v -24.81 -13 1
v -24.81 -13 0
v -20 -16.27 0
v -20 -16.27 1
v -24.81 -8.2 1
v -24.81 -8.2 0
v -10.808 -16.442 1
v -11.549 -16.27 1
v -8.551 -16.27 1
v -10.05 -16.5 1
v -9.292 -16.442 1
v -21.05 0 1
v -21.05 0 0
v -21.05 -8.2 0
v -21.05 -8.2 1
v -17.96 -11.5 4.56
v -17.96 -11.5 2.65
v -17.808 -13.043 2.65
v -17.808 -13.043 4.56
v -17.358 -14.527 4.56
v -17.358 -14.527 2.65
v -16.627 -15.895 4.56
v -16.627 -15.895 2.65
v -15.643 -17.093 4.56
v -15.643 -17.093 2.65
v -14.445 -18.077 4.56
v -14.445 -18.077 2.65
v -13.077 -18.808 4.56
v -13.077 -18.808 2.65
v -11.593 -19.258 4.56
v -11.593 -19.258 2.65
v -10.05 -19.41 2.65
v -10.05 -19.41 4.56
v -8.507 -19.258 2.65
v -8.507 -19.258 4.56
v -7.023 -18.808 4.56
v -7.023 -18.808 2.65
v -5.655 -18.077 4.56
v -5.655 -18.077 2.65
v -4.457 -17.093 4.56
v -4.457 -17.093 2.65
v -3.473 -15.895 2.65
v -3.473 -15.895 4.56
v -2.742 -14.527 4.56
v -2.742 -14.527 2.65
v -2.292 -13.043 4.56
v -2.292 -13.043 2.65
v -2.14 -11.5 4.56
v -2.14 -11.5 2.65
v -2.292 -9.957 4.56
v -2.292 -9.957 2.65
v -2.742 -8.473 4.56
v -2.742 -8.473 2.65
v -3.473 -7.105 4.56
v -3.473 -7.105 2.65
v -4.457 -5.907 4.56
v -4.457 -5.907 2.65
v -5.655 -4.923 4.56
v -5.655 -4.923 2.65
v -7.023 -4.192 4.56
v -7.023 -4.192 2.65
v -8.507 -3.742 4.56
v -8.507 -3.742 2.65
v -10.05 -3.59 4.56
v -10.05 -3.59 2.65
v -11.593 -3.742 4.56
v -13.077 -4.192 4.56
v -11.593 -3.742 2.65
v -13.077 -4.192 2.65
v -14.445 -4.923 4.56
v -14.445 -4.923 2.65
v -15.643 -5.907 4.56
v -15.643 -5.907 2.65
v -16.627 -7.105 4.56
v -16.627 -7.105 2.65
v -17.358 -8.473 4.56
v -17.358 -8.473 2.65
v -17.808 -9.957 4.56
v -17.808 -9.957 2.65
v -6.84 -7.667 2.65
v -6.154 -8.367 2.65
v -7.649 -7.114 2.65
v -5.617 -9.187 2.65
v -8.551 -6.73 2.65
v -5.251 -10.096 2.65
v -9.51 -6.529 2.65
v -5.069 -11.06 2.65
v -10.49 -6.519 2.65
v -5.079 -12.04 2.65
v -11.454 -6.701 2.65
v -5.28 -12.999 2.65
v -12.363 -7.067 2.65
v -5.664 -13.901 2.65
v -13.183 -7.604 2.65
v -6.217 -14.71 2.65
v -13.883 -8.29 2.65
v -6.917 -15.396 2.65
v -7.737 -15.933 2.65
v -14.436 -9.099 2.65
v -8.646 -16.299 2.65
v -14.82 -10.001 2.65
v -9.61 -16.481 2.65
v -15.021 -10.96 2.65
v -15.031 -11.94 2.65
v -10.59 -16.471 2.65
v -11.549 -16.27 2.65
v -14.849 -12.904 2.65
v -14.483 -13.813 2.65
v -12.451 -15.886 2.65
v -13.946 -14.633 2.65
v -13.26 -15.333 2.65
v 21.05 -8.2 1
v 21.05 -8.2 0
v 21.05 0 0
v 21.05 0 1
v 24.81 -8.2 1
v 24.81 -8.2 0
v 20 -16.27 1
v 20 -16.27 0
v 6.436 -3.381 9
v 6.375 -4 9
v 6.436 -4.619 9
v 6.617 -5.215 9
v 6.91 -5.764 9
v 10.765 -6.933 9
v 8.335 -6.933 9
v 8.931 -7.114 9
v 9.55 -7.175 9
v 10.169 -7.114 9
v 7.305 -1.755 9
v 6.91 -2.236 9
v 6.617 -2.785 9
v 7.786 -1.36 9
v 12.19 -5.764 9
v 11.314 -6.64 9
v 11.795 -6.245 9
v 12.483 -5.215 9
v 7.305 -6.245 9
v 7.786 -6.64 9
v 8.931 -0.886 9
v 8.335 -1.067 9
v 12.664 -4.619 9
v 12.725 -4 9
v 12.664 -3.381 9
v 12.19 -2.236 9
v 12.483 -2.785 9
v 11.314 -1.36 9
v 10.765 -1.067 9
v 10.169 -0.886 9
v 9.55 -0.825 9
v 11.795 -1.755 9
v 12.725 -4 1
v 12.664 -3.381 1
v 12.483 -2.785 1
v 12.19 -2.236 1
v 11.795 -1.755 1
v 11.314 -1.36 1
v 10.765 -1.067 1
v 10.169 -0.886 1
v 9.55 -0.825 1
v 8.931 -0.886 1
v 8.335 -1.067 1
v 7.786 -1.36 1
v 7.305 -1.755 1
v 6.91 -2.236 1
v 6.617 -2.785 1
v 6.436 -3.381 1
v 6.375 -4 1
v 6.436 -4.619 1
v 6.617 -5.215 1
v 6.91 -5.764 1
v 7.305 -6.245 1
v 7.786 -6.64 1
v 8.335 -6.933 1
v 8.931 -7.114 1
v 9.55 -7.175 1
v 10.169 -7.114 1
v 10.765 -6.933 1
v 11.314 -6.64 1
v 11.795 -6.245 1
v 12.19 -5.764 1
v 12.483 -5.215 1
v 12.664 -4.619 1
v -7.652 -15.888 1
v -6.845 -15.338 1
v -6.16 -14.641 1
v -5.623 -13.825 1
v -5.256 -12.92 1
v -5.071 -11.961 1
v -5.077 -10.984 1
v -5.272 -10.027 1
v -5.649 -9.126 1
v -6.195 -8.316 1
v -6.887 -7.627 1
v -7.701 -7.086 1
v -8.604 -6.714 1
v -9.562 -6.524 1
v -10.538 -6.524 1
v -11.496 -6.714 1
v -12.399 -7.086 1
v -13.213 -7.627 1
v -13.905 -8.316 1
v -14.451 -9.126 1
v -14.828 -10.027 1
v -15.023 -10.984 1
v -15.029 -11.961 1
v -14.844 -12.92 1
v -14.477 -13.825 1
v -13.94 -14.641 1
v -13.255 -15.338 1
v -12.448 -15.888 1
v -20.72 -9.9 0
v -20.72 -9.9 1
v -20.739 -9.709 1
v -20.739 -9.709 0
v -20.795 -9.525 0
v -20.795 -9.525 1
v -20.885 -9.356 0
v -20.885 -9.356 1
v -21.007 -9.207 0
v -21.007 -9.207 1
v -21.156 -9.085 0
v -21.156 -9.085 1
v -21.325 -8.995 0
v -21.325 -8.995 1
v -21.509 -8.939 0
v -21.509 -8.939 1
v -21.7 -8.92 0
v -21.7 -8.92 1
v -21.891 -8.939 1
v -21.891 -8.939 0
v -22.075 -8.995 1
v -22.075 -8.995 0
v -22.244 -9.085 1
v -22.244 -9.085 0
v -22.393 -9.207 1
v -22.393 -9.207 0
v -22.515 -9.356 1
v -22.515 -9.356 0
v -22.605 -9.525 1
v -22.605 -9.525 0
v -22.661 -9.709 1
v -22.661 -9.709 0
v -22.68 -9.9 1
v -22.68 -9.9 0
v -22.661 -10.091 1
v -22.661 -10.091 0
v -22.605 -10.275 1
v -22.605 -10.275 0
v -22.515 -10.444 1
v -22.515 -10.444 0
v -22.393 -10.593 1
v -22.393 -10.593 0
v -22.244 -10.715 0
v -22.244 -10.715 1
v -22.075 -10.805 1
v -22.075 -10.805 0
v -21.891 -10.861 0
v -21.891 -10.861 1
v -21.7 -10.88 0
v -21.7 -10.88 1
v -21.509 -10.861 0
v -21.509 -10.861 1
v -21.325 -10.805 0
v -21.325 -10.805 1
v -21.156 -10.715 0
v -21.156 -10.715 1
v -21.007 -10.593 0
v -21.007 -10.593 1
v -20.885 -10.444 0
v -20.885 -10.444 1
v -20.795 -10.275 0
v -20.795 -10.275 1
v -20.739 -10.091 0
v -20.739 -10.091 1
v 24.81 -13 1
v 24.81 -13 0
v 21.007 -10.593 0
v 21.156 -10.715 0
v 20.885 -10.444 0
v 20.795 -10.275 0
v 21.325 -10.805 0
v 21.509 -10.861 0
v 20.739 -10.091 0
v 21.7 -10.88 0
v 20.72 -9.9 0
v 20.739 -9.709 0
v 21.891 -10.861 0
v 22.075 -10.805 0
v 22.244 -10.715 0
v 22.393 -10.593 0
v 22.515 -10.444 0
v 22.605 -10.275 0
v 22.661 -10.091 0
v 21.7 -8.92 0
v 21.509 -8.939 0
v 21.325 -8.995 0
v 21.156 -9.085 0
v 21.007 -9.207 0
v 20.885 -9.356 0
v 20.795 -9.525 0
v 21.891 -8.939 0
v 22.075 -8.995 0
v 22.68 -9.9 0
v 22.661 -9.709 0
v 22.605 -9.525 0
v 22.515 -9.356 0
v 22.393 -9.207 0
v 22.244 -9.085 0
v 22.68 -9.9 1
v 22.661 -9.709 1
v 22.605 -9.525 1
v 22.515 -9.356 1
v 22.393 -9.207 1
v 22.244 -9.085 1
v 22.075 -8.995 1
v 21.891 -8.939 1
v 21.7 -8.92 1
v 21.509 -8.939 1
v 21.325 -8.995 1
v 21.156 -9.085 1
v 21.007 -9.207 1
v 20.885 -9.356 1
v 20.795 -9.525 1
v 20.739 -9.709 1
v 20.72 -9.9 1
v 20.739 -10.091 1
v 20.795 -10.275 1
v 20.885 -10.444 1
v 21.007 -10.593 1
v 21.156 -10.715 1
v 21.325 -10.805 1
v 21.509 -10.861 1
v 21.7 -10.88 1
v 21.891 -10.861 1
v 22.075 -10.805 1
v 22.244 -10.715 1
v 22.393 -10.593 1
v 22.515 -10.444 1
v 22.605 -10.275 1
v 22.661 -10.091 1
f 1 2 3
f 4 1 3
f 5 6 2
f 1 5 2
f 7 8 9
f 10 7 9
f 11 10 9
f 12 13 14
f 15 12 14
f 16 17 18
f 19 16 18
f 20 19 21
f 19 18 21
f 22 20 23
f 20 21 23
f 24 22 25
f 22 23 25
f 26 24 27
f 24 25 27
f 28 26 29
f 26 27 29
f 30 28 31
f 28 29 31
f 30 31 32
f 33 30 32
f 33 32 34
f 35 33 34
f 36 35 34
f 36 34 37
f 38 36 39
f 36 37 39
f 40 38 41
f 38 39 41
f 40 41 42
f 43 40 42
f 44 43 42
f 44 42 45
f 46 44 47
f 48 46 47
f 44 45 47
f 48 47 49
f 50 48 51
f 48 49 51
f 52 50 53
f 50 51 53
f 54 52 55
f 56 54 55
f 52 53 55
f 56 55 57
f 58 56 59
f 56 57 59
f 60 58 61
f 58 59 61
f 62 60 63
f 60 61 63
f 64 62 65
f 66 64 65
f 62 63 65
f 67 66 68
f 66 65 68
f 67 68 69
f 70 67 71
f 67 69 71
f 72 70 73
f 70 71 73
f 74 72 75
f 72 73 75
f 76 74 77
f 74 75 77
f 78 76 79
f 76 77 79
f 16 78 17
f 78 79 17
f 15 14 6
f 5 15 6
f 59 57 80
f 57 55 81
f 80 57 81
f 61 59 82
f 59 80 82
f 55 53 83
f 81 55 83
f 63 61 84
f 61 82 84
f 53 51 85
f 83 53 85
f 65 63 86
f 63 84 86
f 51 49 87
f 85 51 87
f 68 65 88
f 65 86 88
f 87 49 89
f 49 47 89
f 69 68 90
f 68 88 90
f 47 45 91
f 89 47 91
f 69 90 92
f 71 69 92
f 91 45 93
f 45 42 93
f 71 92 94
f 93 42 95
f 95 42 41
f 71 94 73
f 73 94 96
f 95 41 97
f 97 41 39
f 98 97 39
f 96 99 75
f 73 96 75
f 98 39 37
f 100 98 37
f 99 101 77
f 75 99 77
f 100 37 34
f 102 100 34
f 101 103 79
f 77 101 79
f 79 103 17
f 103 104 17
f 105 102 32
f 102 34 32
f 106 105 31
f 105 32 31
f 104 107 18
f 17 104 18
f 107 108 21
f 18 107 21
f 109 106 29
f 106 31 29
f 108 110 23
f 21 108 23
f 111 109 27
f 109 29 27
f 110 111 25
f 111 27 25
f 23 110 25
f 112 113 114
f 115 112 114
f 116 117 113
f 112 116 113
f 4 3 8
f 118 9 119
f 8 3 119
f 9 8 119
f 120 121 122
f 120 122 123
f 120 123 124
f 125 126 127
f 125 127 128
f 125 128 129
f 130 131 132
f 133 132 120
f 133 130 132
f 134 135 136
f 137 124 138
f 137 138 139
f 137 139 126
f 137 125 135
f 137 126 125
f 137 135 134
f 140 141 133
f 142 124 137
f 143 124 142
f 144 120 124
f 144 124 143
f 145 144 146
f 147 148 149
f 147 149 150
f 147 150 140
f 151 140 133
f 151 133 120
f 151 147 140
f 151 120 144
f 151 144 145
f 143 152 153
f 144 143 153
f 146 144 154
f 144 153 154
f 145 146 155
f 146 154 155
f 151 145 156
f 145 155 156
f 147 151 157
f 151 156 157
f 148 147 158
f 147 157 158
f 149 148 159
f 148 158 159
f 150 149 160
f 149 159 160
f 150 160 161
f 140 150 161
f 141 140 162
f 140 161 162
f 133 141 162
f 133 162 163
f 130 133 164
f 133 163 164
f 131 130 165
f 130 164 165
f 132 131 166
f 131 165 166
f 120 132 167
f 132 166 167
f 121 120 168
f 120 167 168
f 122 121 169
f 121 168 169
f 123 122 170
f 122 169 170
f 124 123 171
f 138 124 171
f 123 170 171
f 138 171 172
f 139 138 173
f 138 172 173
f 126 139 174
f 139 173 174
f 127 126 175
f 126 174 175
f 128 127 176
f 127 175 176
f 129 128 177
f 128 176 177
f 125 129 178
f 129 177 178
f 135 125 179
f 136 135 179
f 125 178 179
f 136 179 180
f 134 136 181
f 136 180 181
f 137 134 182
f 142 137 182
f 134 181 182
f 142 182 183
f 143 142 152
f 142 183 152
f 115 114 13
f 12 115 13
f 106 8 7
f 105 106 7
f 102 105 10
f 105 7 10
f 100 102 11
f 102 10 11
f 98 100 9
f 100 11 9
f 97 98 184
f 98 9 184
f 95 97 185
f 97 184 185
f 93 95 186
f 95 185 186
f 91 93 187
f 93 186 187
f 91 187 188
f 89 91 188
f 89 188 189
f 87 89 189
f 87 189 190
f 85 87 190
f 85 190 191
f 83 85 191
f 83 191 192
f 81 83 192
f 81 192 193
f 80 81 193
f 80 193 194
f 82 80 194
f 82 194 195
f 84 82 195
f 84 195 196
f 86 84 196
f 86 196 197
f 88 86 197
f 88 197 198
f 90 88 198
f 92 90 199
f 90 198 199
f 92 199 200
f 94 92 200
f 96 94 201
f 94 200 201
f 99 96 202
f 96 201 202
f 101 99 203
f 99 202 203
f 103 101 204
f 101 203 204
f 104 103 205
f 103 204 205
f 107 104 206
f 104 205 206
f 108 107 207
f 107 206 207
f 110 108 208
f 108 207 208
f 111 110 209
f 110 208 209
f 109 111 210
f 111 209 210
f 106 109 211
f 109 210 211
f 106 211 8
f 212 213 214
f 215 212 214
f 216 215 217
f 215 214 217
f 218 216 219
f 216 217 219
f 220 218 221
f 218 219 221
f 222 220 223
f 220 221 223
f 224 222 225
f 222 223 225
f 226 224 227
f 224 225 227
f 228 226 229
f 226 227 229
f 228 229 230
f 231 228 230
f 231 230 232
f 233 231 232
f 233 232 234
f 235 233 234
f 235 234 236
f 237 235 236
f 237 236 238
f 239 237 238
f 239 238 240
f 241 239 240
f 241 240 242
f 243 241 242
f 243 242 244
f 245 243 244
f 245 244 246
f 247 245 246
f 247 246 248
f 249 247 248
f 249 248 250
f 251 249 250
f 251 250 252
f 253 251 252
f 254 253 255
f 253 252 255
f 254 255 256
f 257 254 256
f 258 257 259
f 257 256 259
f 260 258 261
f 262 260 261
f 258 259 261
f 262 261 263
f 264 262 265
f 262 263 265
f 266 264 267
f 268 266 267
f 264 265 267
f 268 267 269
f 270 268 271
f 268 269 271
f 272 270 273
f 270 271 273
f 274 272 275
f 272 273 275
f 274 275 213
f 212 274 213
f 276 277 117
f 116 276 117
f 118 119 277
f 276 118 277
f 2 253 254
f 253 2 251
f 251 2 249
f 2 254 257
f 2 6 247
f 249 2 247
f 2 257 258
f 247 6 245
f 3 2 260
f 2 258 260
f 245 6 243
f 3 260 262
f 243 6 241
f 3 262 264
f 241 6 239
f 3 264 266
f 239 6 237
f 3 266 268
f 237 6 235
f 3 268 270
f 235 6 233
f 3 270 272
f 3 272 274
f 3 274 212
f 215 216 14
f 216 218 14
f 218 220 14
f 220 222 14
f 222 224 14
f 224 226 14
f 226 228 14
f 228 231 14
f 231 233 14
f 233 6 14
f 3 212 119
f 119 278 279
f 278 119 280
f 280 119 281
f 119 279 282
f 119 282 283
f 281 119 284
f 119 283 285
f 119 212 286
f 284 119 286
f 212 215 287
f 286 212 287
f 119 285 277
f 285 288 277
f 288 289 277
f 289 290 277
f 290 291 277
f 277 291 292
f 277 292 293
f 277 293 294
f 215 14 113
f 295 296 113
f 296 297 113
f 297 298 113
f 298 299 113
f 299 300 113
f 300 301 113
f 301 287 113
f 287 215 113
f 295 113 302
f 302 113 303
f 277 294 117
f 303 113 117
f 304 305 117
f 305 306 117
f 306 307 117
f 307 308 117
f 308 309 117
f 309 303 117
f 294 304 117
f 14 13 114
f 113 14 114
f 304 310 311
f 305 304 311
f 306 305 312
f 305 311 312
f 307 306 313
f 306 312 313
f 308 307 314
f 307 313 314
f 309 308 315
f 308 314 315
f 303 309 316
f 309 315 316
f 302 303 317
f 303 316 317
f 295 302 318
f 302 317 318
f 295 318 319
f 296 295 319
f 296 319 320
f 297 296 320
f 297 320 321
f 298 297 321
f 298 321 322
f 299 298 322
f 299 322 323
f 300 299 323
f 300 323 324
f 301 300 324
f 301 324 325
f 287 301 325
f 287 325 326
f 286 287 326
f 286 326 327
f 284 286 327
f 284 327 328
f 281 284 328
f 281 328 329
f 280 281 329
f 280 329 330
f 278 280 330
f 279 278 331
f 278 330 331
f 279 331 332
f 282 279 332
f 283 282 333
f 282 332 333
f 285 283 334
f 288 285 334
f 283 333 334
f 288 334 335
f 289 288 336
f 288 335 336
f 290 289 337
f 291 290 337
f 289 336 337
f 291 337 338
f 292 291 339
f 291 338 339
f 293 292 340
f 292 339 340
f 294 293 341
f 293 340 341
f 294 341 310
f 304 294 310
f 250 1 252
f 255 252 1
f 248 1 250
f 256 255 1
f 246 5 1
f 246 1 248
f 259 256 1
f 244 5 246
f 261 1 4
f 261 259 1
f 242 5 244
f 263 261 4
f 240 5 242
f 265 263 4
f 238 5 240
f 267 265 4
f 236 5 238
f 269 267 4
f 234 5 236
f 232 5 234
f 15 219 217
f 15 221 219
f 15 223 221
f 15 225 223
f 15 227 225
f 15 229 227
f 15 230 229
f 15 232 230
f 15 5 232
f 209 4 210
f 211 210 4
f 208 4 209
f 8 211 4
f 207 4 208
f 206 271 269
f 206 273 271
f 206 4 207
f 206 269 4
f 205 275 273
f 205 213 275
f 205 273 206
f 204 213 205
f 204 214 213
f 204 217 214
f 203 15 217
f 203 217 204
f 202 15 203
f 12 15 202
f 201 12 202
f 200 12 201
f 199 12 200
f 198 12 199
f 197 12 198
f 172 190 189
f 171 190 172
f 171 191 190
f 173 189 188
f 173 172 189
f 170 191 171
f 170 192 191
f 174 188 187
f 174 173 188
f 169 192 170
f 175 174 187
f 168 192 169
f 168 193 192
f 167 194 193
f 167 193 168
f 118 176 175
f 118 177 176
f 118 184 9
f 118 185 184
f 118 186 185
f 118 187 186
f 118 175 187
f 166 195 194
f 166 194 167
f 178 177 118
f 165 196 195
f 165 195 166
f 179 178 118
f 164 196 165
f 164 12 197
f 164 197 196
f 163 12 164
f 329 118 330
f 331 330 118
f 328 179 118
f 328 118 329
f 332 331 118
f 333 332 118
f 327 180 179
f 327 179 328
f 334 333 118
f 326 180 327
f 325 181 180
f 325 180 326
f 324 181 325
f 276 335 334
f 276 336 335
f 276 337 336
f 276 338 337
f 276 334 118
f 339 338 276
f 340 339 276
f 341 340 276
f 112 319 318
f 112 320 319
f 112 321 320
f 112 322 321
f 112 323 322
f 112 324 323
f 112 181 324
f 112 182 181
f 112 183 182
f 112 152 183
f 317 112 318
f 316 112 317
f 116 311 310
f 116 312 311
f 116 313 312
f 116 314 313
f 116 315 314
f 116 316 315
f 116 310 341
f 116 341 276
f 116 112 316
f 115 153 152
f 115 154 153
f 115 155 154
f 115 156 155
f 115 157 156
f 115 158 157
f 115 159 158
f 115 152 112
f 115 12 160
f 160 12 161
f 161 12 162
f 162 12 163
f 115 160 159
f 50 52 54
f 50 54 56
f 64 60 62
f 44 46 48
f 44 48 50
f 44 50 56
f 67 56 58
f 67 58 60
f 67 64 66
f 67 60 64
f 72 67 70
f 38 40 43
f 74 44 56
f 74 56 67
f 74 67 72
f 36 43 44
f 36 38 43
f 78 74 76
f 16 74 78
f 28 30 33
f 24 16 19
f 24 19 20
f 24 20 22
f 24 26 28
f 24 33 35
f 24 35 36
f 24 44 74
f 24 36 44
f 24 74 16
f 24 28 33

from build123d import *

# Parameters (mm, degrees)
BOSS_EXTRUDE1_DEPTH = 1
CUT_EXTRUDE1_REACH  = 31.686
SKETCH5_R           = 0.98
SKETCH2_R           = 3.175
BOSS_EXTRUDE2_DEPTH = 8
BOSS_EXTRUDE3_START = 1.65
SKETCH3_R           = 7.91
BOSS_EXTRUDE3_DEPTH = 1.91
BOSS_EXTRUDE4_REACH = 34.501
SKETCH4_R           = 5


with BuildPart() as part:
    # Sketch1 → Boss-Extrude1 (new body)
    with BuildSketch(Plane.XY):
        Polygon((21.05, -8.2), (21.05, 0), (0, 0), (0, -16.27), (20, -16.27), (24.81, -13), (24.81, -8.2), align=None)
        Polygon((0, -16.27), (0, 0), (-21.05, 0), (-21.05, -8.2), (-24.81, -8.2), (-24.81, -13), (-20, -16.27), align=None)
    extrude(amount=BOSS_EXTRUDE1_DEPTH)

    # Sketch5 → Cut-Extrude1 (cut, up to next)
    with BuildSketch(Plane.XY.offset(1), mode=Mode.PRIVATE) as cut_extrude1_sk1:
        with Locations((-21.7, -9.9)):
            Circle(SKETCH5_R)
    cut_extrude1_tool1 = extrude(cut_extrude1_sk1.sketch, amount=-CUT_EXTRUDE1_REACH, mode=Mode.PRIVATE) & part.part
    # Sketch5 → Cut-Extrude1 (cut, up to next)
    with BuildSketch(Plane.XY.offset(1), mode=Mode.PRIVATE) as cut_extrude1_sk2:
        with Locations((21.7, -9.9)):
            Circle(SKETCH5_R)
    cut_extrude1_tool2 = extrude(cut_extrude1_sk2.sketch, amount=-CUT_EXTRUDE1_REACH, mode=Mode.PRIVATE) & part.part
    add(cut_extrude1_tool1.solids().sort_by_distance((-21.7, -9.9, 1))[0], mode=Mode.SUBTRACT)
    add(cut_extrude1_tool2.solids().sort_by_distance((21.7, -9.9, 1))[0], mode=Mode.SUBTRACT)

    # Sketch2 → Boss-Extrude2 (add)
    with BuildSketch(Plane.XY.offset(1)):
        with Locations((9.55, -4)):
            Circle(SKETCH2_R)
    extrude(amount=BOSS_EXTRUDE2_DEPTH)


with BuildPart() as body_2:
    # Sketch3 → Boss-Extrude3 (new body)
    with BuildSketch(Plane.XY.offset(1).offset(BOSS_EXTRUDE3_START)):
        with Locations(Location((-10.05, -11.5, 0), (0, 0, 180))):
            Circle(SKETCH3_R)
    extrude(amount=BOSS_EXTRUDE3_DEPTH)

    # Sketch4 → Boss-Extrude4 (add, up to next)
    with BuildSketch(Plane.XY.offset(1), mode=Mode.PRIVATE) as boss_extrude4_sk1:
        with Locations(Location((-10.05, -11.5, 0), (0, 0, 252.554012294))):
            Circle(SKETCH4_R)
    boss_extrude4_tool1 = extrude(boss_extrude4_sk1.sketch, amount=BOSS_EXTRUDE4_REACH, mode=Mode.PRIVATE) - body_2.part

    add(part.part)  # Boss-Extrude4 merges part
    add(boss_extrude4_tool1.solids().sort_by_distance((-10.05, -11.5, 1))[0])


solid = body_2.part
